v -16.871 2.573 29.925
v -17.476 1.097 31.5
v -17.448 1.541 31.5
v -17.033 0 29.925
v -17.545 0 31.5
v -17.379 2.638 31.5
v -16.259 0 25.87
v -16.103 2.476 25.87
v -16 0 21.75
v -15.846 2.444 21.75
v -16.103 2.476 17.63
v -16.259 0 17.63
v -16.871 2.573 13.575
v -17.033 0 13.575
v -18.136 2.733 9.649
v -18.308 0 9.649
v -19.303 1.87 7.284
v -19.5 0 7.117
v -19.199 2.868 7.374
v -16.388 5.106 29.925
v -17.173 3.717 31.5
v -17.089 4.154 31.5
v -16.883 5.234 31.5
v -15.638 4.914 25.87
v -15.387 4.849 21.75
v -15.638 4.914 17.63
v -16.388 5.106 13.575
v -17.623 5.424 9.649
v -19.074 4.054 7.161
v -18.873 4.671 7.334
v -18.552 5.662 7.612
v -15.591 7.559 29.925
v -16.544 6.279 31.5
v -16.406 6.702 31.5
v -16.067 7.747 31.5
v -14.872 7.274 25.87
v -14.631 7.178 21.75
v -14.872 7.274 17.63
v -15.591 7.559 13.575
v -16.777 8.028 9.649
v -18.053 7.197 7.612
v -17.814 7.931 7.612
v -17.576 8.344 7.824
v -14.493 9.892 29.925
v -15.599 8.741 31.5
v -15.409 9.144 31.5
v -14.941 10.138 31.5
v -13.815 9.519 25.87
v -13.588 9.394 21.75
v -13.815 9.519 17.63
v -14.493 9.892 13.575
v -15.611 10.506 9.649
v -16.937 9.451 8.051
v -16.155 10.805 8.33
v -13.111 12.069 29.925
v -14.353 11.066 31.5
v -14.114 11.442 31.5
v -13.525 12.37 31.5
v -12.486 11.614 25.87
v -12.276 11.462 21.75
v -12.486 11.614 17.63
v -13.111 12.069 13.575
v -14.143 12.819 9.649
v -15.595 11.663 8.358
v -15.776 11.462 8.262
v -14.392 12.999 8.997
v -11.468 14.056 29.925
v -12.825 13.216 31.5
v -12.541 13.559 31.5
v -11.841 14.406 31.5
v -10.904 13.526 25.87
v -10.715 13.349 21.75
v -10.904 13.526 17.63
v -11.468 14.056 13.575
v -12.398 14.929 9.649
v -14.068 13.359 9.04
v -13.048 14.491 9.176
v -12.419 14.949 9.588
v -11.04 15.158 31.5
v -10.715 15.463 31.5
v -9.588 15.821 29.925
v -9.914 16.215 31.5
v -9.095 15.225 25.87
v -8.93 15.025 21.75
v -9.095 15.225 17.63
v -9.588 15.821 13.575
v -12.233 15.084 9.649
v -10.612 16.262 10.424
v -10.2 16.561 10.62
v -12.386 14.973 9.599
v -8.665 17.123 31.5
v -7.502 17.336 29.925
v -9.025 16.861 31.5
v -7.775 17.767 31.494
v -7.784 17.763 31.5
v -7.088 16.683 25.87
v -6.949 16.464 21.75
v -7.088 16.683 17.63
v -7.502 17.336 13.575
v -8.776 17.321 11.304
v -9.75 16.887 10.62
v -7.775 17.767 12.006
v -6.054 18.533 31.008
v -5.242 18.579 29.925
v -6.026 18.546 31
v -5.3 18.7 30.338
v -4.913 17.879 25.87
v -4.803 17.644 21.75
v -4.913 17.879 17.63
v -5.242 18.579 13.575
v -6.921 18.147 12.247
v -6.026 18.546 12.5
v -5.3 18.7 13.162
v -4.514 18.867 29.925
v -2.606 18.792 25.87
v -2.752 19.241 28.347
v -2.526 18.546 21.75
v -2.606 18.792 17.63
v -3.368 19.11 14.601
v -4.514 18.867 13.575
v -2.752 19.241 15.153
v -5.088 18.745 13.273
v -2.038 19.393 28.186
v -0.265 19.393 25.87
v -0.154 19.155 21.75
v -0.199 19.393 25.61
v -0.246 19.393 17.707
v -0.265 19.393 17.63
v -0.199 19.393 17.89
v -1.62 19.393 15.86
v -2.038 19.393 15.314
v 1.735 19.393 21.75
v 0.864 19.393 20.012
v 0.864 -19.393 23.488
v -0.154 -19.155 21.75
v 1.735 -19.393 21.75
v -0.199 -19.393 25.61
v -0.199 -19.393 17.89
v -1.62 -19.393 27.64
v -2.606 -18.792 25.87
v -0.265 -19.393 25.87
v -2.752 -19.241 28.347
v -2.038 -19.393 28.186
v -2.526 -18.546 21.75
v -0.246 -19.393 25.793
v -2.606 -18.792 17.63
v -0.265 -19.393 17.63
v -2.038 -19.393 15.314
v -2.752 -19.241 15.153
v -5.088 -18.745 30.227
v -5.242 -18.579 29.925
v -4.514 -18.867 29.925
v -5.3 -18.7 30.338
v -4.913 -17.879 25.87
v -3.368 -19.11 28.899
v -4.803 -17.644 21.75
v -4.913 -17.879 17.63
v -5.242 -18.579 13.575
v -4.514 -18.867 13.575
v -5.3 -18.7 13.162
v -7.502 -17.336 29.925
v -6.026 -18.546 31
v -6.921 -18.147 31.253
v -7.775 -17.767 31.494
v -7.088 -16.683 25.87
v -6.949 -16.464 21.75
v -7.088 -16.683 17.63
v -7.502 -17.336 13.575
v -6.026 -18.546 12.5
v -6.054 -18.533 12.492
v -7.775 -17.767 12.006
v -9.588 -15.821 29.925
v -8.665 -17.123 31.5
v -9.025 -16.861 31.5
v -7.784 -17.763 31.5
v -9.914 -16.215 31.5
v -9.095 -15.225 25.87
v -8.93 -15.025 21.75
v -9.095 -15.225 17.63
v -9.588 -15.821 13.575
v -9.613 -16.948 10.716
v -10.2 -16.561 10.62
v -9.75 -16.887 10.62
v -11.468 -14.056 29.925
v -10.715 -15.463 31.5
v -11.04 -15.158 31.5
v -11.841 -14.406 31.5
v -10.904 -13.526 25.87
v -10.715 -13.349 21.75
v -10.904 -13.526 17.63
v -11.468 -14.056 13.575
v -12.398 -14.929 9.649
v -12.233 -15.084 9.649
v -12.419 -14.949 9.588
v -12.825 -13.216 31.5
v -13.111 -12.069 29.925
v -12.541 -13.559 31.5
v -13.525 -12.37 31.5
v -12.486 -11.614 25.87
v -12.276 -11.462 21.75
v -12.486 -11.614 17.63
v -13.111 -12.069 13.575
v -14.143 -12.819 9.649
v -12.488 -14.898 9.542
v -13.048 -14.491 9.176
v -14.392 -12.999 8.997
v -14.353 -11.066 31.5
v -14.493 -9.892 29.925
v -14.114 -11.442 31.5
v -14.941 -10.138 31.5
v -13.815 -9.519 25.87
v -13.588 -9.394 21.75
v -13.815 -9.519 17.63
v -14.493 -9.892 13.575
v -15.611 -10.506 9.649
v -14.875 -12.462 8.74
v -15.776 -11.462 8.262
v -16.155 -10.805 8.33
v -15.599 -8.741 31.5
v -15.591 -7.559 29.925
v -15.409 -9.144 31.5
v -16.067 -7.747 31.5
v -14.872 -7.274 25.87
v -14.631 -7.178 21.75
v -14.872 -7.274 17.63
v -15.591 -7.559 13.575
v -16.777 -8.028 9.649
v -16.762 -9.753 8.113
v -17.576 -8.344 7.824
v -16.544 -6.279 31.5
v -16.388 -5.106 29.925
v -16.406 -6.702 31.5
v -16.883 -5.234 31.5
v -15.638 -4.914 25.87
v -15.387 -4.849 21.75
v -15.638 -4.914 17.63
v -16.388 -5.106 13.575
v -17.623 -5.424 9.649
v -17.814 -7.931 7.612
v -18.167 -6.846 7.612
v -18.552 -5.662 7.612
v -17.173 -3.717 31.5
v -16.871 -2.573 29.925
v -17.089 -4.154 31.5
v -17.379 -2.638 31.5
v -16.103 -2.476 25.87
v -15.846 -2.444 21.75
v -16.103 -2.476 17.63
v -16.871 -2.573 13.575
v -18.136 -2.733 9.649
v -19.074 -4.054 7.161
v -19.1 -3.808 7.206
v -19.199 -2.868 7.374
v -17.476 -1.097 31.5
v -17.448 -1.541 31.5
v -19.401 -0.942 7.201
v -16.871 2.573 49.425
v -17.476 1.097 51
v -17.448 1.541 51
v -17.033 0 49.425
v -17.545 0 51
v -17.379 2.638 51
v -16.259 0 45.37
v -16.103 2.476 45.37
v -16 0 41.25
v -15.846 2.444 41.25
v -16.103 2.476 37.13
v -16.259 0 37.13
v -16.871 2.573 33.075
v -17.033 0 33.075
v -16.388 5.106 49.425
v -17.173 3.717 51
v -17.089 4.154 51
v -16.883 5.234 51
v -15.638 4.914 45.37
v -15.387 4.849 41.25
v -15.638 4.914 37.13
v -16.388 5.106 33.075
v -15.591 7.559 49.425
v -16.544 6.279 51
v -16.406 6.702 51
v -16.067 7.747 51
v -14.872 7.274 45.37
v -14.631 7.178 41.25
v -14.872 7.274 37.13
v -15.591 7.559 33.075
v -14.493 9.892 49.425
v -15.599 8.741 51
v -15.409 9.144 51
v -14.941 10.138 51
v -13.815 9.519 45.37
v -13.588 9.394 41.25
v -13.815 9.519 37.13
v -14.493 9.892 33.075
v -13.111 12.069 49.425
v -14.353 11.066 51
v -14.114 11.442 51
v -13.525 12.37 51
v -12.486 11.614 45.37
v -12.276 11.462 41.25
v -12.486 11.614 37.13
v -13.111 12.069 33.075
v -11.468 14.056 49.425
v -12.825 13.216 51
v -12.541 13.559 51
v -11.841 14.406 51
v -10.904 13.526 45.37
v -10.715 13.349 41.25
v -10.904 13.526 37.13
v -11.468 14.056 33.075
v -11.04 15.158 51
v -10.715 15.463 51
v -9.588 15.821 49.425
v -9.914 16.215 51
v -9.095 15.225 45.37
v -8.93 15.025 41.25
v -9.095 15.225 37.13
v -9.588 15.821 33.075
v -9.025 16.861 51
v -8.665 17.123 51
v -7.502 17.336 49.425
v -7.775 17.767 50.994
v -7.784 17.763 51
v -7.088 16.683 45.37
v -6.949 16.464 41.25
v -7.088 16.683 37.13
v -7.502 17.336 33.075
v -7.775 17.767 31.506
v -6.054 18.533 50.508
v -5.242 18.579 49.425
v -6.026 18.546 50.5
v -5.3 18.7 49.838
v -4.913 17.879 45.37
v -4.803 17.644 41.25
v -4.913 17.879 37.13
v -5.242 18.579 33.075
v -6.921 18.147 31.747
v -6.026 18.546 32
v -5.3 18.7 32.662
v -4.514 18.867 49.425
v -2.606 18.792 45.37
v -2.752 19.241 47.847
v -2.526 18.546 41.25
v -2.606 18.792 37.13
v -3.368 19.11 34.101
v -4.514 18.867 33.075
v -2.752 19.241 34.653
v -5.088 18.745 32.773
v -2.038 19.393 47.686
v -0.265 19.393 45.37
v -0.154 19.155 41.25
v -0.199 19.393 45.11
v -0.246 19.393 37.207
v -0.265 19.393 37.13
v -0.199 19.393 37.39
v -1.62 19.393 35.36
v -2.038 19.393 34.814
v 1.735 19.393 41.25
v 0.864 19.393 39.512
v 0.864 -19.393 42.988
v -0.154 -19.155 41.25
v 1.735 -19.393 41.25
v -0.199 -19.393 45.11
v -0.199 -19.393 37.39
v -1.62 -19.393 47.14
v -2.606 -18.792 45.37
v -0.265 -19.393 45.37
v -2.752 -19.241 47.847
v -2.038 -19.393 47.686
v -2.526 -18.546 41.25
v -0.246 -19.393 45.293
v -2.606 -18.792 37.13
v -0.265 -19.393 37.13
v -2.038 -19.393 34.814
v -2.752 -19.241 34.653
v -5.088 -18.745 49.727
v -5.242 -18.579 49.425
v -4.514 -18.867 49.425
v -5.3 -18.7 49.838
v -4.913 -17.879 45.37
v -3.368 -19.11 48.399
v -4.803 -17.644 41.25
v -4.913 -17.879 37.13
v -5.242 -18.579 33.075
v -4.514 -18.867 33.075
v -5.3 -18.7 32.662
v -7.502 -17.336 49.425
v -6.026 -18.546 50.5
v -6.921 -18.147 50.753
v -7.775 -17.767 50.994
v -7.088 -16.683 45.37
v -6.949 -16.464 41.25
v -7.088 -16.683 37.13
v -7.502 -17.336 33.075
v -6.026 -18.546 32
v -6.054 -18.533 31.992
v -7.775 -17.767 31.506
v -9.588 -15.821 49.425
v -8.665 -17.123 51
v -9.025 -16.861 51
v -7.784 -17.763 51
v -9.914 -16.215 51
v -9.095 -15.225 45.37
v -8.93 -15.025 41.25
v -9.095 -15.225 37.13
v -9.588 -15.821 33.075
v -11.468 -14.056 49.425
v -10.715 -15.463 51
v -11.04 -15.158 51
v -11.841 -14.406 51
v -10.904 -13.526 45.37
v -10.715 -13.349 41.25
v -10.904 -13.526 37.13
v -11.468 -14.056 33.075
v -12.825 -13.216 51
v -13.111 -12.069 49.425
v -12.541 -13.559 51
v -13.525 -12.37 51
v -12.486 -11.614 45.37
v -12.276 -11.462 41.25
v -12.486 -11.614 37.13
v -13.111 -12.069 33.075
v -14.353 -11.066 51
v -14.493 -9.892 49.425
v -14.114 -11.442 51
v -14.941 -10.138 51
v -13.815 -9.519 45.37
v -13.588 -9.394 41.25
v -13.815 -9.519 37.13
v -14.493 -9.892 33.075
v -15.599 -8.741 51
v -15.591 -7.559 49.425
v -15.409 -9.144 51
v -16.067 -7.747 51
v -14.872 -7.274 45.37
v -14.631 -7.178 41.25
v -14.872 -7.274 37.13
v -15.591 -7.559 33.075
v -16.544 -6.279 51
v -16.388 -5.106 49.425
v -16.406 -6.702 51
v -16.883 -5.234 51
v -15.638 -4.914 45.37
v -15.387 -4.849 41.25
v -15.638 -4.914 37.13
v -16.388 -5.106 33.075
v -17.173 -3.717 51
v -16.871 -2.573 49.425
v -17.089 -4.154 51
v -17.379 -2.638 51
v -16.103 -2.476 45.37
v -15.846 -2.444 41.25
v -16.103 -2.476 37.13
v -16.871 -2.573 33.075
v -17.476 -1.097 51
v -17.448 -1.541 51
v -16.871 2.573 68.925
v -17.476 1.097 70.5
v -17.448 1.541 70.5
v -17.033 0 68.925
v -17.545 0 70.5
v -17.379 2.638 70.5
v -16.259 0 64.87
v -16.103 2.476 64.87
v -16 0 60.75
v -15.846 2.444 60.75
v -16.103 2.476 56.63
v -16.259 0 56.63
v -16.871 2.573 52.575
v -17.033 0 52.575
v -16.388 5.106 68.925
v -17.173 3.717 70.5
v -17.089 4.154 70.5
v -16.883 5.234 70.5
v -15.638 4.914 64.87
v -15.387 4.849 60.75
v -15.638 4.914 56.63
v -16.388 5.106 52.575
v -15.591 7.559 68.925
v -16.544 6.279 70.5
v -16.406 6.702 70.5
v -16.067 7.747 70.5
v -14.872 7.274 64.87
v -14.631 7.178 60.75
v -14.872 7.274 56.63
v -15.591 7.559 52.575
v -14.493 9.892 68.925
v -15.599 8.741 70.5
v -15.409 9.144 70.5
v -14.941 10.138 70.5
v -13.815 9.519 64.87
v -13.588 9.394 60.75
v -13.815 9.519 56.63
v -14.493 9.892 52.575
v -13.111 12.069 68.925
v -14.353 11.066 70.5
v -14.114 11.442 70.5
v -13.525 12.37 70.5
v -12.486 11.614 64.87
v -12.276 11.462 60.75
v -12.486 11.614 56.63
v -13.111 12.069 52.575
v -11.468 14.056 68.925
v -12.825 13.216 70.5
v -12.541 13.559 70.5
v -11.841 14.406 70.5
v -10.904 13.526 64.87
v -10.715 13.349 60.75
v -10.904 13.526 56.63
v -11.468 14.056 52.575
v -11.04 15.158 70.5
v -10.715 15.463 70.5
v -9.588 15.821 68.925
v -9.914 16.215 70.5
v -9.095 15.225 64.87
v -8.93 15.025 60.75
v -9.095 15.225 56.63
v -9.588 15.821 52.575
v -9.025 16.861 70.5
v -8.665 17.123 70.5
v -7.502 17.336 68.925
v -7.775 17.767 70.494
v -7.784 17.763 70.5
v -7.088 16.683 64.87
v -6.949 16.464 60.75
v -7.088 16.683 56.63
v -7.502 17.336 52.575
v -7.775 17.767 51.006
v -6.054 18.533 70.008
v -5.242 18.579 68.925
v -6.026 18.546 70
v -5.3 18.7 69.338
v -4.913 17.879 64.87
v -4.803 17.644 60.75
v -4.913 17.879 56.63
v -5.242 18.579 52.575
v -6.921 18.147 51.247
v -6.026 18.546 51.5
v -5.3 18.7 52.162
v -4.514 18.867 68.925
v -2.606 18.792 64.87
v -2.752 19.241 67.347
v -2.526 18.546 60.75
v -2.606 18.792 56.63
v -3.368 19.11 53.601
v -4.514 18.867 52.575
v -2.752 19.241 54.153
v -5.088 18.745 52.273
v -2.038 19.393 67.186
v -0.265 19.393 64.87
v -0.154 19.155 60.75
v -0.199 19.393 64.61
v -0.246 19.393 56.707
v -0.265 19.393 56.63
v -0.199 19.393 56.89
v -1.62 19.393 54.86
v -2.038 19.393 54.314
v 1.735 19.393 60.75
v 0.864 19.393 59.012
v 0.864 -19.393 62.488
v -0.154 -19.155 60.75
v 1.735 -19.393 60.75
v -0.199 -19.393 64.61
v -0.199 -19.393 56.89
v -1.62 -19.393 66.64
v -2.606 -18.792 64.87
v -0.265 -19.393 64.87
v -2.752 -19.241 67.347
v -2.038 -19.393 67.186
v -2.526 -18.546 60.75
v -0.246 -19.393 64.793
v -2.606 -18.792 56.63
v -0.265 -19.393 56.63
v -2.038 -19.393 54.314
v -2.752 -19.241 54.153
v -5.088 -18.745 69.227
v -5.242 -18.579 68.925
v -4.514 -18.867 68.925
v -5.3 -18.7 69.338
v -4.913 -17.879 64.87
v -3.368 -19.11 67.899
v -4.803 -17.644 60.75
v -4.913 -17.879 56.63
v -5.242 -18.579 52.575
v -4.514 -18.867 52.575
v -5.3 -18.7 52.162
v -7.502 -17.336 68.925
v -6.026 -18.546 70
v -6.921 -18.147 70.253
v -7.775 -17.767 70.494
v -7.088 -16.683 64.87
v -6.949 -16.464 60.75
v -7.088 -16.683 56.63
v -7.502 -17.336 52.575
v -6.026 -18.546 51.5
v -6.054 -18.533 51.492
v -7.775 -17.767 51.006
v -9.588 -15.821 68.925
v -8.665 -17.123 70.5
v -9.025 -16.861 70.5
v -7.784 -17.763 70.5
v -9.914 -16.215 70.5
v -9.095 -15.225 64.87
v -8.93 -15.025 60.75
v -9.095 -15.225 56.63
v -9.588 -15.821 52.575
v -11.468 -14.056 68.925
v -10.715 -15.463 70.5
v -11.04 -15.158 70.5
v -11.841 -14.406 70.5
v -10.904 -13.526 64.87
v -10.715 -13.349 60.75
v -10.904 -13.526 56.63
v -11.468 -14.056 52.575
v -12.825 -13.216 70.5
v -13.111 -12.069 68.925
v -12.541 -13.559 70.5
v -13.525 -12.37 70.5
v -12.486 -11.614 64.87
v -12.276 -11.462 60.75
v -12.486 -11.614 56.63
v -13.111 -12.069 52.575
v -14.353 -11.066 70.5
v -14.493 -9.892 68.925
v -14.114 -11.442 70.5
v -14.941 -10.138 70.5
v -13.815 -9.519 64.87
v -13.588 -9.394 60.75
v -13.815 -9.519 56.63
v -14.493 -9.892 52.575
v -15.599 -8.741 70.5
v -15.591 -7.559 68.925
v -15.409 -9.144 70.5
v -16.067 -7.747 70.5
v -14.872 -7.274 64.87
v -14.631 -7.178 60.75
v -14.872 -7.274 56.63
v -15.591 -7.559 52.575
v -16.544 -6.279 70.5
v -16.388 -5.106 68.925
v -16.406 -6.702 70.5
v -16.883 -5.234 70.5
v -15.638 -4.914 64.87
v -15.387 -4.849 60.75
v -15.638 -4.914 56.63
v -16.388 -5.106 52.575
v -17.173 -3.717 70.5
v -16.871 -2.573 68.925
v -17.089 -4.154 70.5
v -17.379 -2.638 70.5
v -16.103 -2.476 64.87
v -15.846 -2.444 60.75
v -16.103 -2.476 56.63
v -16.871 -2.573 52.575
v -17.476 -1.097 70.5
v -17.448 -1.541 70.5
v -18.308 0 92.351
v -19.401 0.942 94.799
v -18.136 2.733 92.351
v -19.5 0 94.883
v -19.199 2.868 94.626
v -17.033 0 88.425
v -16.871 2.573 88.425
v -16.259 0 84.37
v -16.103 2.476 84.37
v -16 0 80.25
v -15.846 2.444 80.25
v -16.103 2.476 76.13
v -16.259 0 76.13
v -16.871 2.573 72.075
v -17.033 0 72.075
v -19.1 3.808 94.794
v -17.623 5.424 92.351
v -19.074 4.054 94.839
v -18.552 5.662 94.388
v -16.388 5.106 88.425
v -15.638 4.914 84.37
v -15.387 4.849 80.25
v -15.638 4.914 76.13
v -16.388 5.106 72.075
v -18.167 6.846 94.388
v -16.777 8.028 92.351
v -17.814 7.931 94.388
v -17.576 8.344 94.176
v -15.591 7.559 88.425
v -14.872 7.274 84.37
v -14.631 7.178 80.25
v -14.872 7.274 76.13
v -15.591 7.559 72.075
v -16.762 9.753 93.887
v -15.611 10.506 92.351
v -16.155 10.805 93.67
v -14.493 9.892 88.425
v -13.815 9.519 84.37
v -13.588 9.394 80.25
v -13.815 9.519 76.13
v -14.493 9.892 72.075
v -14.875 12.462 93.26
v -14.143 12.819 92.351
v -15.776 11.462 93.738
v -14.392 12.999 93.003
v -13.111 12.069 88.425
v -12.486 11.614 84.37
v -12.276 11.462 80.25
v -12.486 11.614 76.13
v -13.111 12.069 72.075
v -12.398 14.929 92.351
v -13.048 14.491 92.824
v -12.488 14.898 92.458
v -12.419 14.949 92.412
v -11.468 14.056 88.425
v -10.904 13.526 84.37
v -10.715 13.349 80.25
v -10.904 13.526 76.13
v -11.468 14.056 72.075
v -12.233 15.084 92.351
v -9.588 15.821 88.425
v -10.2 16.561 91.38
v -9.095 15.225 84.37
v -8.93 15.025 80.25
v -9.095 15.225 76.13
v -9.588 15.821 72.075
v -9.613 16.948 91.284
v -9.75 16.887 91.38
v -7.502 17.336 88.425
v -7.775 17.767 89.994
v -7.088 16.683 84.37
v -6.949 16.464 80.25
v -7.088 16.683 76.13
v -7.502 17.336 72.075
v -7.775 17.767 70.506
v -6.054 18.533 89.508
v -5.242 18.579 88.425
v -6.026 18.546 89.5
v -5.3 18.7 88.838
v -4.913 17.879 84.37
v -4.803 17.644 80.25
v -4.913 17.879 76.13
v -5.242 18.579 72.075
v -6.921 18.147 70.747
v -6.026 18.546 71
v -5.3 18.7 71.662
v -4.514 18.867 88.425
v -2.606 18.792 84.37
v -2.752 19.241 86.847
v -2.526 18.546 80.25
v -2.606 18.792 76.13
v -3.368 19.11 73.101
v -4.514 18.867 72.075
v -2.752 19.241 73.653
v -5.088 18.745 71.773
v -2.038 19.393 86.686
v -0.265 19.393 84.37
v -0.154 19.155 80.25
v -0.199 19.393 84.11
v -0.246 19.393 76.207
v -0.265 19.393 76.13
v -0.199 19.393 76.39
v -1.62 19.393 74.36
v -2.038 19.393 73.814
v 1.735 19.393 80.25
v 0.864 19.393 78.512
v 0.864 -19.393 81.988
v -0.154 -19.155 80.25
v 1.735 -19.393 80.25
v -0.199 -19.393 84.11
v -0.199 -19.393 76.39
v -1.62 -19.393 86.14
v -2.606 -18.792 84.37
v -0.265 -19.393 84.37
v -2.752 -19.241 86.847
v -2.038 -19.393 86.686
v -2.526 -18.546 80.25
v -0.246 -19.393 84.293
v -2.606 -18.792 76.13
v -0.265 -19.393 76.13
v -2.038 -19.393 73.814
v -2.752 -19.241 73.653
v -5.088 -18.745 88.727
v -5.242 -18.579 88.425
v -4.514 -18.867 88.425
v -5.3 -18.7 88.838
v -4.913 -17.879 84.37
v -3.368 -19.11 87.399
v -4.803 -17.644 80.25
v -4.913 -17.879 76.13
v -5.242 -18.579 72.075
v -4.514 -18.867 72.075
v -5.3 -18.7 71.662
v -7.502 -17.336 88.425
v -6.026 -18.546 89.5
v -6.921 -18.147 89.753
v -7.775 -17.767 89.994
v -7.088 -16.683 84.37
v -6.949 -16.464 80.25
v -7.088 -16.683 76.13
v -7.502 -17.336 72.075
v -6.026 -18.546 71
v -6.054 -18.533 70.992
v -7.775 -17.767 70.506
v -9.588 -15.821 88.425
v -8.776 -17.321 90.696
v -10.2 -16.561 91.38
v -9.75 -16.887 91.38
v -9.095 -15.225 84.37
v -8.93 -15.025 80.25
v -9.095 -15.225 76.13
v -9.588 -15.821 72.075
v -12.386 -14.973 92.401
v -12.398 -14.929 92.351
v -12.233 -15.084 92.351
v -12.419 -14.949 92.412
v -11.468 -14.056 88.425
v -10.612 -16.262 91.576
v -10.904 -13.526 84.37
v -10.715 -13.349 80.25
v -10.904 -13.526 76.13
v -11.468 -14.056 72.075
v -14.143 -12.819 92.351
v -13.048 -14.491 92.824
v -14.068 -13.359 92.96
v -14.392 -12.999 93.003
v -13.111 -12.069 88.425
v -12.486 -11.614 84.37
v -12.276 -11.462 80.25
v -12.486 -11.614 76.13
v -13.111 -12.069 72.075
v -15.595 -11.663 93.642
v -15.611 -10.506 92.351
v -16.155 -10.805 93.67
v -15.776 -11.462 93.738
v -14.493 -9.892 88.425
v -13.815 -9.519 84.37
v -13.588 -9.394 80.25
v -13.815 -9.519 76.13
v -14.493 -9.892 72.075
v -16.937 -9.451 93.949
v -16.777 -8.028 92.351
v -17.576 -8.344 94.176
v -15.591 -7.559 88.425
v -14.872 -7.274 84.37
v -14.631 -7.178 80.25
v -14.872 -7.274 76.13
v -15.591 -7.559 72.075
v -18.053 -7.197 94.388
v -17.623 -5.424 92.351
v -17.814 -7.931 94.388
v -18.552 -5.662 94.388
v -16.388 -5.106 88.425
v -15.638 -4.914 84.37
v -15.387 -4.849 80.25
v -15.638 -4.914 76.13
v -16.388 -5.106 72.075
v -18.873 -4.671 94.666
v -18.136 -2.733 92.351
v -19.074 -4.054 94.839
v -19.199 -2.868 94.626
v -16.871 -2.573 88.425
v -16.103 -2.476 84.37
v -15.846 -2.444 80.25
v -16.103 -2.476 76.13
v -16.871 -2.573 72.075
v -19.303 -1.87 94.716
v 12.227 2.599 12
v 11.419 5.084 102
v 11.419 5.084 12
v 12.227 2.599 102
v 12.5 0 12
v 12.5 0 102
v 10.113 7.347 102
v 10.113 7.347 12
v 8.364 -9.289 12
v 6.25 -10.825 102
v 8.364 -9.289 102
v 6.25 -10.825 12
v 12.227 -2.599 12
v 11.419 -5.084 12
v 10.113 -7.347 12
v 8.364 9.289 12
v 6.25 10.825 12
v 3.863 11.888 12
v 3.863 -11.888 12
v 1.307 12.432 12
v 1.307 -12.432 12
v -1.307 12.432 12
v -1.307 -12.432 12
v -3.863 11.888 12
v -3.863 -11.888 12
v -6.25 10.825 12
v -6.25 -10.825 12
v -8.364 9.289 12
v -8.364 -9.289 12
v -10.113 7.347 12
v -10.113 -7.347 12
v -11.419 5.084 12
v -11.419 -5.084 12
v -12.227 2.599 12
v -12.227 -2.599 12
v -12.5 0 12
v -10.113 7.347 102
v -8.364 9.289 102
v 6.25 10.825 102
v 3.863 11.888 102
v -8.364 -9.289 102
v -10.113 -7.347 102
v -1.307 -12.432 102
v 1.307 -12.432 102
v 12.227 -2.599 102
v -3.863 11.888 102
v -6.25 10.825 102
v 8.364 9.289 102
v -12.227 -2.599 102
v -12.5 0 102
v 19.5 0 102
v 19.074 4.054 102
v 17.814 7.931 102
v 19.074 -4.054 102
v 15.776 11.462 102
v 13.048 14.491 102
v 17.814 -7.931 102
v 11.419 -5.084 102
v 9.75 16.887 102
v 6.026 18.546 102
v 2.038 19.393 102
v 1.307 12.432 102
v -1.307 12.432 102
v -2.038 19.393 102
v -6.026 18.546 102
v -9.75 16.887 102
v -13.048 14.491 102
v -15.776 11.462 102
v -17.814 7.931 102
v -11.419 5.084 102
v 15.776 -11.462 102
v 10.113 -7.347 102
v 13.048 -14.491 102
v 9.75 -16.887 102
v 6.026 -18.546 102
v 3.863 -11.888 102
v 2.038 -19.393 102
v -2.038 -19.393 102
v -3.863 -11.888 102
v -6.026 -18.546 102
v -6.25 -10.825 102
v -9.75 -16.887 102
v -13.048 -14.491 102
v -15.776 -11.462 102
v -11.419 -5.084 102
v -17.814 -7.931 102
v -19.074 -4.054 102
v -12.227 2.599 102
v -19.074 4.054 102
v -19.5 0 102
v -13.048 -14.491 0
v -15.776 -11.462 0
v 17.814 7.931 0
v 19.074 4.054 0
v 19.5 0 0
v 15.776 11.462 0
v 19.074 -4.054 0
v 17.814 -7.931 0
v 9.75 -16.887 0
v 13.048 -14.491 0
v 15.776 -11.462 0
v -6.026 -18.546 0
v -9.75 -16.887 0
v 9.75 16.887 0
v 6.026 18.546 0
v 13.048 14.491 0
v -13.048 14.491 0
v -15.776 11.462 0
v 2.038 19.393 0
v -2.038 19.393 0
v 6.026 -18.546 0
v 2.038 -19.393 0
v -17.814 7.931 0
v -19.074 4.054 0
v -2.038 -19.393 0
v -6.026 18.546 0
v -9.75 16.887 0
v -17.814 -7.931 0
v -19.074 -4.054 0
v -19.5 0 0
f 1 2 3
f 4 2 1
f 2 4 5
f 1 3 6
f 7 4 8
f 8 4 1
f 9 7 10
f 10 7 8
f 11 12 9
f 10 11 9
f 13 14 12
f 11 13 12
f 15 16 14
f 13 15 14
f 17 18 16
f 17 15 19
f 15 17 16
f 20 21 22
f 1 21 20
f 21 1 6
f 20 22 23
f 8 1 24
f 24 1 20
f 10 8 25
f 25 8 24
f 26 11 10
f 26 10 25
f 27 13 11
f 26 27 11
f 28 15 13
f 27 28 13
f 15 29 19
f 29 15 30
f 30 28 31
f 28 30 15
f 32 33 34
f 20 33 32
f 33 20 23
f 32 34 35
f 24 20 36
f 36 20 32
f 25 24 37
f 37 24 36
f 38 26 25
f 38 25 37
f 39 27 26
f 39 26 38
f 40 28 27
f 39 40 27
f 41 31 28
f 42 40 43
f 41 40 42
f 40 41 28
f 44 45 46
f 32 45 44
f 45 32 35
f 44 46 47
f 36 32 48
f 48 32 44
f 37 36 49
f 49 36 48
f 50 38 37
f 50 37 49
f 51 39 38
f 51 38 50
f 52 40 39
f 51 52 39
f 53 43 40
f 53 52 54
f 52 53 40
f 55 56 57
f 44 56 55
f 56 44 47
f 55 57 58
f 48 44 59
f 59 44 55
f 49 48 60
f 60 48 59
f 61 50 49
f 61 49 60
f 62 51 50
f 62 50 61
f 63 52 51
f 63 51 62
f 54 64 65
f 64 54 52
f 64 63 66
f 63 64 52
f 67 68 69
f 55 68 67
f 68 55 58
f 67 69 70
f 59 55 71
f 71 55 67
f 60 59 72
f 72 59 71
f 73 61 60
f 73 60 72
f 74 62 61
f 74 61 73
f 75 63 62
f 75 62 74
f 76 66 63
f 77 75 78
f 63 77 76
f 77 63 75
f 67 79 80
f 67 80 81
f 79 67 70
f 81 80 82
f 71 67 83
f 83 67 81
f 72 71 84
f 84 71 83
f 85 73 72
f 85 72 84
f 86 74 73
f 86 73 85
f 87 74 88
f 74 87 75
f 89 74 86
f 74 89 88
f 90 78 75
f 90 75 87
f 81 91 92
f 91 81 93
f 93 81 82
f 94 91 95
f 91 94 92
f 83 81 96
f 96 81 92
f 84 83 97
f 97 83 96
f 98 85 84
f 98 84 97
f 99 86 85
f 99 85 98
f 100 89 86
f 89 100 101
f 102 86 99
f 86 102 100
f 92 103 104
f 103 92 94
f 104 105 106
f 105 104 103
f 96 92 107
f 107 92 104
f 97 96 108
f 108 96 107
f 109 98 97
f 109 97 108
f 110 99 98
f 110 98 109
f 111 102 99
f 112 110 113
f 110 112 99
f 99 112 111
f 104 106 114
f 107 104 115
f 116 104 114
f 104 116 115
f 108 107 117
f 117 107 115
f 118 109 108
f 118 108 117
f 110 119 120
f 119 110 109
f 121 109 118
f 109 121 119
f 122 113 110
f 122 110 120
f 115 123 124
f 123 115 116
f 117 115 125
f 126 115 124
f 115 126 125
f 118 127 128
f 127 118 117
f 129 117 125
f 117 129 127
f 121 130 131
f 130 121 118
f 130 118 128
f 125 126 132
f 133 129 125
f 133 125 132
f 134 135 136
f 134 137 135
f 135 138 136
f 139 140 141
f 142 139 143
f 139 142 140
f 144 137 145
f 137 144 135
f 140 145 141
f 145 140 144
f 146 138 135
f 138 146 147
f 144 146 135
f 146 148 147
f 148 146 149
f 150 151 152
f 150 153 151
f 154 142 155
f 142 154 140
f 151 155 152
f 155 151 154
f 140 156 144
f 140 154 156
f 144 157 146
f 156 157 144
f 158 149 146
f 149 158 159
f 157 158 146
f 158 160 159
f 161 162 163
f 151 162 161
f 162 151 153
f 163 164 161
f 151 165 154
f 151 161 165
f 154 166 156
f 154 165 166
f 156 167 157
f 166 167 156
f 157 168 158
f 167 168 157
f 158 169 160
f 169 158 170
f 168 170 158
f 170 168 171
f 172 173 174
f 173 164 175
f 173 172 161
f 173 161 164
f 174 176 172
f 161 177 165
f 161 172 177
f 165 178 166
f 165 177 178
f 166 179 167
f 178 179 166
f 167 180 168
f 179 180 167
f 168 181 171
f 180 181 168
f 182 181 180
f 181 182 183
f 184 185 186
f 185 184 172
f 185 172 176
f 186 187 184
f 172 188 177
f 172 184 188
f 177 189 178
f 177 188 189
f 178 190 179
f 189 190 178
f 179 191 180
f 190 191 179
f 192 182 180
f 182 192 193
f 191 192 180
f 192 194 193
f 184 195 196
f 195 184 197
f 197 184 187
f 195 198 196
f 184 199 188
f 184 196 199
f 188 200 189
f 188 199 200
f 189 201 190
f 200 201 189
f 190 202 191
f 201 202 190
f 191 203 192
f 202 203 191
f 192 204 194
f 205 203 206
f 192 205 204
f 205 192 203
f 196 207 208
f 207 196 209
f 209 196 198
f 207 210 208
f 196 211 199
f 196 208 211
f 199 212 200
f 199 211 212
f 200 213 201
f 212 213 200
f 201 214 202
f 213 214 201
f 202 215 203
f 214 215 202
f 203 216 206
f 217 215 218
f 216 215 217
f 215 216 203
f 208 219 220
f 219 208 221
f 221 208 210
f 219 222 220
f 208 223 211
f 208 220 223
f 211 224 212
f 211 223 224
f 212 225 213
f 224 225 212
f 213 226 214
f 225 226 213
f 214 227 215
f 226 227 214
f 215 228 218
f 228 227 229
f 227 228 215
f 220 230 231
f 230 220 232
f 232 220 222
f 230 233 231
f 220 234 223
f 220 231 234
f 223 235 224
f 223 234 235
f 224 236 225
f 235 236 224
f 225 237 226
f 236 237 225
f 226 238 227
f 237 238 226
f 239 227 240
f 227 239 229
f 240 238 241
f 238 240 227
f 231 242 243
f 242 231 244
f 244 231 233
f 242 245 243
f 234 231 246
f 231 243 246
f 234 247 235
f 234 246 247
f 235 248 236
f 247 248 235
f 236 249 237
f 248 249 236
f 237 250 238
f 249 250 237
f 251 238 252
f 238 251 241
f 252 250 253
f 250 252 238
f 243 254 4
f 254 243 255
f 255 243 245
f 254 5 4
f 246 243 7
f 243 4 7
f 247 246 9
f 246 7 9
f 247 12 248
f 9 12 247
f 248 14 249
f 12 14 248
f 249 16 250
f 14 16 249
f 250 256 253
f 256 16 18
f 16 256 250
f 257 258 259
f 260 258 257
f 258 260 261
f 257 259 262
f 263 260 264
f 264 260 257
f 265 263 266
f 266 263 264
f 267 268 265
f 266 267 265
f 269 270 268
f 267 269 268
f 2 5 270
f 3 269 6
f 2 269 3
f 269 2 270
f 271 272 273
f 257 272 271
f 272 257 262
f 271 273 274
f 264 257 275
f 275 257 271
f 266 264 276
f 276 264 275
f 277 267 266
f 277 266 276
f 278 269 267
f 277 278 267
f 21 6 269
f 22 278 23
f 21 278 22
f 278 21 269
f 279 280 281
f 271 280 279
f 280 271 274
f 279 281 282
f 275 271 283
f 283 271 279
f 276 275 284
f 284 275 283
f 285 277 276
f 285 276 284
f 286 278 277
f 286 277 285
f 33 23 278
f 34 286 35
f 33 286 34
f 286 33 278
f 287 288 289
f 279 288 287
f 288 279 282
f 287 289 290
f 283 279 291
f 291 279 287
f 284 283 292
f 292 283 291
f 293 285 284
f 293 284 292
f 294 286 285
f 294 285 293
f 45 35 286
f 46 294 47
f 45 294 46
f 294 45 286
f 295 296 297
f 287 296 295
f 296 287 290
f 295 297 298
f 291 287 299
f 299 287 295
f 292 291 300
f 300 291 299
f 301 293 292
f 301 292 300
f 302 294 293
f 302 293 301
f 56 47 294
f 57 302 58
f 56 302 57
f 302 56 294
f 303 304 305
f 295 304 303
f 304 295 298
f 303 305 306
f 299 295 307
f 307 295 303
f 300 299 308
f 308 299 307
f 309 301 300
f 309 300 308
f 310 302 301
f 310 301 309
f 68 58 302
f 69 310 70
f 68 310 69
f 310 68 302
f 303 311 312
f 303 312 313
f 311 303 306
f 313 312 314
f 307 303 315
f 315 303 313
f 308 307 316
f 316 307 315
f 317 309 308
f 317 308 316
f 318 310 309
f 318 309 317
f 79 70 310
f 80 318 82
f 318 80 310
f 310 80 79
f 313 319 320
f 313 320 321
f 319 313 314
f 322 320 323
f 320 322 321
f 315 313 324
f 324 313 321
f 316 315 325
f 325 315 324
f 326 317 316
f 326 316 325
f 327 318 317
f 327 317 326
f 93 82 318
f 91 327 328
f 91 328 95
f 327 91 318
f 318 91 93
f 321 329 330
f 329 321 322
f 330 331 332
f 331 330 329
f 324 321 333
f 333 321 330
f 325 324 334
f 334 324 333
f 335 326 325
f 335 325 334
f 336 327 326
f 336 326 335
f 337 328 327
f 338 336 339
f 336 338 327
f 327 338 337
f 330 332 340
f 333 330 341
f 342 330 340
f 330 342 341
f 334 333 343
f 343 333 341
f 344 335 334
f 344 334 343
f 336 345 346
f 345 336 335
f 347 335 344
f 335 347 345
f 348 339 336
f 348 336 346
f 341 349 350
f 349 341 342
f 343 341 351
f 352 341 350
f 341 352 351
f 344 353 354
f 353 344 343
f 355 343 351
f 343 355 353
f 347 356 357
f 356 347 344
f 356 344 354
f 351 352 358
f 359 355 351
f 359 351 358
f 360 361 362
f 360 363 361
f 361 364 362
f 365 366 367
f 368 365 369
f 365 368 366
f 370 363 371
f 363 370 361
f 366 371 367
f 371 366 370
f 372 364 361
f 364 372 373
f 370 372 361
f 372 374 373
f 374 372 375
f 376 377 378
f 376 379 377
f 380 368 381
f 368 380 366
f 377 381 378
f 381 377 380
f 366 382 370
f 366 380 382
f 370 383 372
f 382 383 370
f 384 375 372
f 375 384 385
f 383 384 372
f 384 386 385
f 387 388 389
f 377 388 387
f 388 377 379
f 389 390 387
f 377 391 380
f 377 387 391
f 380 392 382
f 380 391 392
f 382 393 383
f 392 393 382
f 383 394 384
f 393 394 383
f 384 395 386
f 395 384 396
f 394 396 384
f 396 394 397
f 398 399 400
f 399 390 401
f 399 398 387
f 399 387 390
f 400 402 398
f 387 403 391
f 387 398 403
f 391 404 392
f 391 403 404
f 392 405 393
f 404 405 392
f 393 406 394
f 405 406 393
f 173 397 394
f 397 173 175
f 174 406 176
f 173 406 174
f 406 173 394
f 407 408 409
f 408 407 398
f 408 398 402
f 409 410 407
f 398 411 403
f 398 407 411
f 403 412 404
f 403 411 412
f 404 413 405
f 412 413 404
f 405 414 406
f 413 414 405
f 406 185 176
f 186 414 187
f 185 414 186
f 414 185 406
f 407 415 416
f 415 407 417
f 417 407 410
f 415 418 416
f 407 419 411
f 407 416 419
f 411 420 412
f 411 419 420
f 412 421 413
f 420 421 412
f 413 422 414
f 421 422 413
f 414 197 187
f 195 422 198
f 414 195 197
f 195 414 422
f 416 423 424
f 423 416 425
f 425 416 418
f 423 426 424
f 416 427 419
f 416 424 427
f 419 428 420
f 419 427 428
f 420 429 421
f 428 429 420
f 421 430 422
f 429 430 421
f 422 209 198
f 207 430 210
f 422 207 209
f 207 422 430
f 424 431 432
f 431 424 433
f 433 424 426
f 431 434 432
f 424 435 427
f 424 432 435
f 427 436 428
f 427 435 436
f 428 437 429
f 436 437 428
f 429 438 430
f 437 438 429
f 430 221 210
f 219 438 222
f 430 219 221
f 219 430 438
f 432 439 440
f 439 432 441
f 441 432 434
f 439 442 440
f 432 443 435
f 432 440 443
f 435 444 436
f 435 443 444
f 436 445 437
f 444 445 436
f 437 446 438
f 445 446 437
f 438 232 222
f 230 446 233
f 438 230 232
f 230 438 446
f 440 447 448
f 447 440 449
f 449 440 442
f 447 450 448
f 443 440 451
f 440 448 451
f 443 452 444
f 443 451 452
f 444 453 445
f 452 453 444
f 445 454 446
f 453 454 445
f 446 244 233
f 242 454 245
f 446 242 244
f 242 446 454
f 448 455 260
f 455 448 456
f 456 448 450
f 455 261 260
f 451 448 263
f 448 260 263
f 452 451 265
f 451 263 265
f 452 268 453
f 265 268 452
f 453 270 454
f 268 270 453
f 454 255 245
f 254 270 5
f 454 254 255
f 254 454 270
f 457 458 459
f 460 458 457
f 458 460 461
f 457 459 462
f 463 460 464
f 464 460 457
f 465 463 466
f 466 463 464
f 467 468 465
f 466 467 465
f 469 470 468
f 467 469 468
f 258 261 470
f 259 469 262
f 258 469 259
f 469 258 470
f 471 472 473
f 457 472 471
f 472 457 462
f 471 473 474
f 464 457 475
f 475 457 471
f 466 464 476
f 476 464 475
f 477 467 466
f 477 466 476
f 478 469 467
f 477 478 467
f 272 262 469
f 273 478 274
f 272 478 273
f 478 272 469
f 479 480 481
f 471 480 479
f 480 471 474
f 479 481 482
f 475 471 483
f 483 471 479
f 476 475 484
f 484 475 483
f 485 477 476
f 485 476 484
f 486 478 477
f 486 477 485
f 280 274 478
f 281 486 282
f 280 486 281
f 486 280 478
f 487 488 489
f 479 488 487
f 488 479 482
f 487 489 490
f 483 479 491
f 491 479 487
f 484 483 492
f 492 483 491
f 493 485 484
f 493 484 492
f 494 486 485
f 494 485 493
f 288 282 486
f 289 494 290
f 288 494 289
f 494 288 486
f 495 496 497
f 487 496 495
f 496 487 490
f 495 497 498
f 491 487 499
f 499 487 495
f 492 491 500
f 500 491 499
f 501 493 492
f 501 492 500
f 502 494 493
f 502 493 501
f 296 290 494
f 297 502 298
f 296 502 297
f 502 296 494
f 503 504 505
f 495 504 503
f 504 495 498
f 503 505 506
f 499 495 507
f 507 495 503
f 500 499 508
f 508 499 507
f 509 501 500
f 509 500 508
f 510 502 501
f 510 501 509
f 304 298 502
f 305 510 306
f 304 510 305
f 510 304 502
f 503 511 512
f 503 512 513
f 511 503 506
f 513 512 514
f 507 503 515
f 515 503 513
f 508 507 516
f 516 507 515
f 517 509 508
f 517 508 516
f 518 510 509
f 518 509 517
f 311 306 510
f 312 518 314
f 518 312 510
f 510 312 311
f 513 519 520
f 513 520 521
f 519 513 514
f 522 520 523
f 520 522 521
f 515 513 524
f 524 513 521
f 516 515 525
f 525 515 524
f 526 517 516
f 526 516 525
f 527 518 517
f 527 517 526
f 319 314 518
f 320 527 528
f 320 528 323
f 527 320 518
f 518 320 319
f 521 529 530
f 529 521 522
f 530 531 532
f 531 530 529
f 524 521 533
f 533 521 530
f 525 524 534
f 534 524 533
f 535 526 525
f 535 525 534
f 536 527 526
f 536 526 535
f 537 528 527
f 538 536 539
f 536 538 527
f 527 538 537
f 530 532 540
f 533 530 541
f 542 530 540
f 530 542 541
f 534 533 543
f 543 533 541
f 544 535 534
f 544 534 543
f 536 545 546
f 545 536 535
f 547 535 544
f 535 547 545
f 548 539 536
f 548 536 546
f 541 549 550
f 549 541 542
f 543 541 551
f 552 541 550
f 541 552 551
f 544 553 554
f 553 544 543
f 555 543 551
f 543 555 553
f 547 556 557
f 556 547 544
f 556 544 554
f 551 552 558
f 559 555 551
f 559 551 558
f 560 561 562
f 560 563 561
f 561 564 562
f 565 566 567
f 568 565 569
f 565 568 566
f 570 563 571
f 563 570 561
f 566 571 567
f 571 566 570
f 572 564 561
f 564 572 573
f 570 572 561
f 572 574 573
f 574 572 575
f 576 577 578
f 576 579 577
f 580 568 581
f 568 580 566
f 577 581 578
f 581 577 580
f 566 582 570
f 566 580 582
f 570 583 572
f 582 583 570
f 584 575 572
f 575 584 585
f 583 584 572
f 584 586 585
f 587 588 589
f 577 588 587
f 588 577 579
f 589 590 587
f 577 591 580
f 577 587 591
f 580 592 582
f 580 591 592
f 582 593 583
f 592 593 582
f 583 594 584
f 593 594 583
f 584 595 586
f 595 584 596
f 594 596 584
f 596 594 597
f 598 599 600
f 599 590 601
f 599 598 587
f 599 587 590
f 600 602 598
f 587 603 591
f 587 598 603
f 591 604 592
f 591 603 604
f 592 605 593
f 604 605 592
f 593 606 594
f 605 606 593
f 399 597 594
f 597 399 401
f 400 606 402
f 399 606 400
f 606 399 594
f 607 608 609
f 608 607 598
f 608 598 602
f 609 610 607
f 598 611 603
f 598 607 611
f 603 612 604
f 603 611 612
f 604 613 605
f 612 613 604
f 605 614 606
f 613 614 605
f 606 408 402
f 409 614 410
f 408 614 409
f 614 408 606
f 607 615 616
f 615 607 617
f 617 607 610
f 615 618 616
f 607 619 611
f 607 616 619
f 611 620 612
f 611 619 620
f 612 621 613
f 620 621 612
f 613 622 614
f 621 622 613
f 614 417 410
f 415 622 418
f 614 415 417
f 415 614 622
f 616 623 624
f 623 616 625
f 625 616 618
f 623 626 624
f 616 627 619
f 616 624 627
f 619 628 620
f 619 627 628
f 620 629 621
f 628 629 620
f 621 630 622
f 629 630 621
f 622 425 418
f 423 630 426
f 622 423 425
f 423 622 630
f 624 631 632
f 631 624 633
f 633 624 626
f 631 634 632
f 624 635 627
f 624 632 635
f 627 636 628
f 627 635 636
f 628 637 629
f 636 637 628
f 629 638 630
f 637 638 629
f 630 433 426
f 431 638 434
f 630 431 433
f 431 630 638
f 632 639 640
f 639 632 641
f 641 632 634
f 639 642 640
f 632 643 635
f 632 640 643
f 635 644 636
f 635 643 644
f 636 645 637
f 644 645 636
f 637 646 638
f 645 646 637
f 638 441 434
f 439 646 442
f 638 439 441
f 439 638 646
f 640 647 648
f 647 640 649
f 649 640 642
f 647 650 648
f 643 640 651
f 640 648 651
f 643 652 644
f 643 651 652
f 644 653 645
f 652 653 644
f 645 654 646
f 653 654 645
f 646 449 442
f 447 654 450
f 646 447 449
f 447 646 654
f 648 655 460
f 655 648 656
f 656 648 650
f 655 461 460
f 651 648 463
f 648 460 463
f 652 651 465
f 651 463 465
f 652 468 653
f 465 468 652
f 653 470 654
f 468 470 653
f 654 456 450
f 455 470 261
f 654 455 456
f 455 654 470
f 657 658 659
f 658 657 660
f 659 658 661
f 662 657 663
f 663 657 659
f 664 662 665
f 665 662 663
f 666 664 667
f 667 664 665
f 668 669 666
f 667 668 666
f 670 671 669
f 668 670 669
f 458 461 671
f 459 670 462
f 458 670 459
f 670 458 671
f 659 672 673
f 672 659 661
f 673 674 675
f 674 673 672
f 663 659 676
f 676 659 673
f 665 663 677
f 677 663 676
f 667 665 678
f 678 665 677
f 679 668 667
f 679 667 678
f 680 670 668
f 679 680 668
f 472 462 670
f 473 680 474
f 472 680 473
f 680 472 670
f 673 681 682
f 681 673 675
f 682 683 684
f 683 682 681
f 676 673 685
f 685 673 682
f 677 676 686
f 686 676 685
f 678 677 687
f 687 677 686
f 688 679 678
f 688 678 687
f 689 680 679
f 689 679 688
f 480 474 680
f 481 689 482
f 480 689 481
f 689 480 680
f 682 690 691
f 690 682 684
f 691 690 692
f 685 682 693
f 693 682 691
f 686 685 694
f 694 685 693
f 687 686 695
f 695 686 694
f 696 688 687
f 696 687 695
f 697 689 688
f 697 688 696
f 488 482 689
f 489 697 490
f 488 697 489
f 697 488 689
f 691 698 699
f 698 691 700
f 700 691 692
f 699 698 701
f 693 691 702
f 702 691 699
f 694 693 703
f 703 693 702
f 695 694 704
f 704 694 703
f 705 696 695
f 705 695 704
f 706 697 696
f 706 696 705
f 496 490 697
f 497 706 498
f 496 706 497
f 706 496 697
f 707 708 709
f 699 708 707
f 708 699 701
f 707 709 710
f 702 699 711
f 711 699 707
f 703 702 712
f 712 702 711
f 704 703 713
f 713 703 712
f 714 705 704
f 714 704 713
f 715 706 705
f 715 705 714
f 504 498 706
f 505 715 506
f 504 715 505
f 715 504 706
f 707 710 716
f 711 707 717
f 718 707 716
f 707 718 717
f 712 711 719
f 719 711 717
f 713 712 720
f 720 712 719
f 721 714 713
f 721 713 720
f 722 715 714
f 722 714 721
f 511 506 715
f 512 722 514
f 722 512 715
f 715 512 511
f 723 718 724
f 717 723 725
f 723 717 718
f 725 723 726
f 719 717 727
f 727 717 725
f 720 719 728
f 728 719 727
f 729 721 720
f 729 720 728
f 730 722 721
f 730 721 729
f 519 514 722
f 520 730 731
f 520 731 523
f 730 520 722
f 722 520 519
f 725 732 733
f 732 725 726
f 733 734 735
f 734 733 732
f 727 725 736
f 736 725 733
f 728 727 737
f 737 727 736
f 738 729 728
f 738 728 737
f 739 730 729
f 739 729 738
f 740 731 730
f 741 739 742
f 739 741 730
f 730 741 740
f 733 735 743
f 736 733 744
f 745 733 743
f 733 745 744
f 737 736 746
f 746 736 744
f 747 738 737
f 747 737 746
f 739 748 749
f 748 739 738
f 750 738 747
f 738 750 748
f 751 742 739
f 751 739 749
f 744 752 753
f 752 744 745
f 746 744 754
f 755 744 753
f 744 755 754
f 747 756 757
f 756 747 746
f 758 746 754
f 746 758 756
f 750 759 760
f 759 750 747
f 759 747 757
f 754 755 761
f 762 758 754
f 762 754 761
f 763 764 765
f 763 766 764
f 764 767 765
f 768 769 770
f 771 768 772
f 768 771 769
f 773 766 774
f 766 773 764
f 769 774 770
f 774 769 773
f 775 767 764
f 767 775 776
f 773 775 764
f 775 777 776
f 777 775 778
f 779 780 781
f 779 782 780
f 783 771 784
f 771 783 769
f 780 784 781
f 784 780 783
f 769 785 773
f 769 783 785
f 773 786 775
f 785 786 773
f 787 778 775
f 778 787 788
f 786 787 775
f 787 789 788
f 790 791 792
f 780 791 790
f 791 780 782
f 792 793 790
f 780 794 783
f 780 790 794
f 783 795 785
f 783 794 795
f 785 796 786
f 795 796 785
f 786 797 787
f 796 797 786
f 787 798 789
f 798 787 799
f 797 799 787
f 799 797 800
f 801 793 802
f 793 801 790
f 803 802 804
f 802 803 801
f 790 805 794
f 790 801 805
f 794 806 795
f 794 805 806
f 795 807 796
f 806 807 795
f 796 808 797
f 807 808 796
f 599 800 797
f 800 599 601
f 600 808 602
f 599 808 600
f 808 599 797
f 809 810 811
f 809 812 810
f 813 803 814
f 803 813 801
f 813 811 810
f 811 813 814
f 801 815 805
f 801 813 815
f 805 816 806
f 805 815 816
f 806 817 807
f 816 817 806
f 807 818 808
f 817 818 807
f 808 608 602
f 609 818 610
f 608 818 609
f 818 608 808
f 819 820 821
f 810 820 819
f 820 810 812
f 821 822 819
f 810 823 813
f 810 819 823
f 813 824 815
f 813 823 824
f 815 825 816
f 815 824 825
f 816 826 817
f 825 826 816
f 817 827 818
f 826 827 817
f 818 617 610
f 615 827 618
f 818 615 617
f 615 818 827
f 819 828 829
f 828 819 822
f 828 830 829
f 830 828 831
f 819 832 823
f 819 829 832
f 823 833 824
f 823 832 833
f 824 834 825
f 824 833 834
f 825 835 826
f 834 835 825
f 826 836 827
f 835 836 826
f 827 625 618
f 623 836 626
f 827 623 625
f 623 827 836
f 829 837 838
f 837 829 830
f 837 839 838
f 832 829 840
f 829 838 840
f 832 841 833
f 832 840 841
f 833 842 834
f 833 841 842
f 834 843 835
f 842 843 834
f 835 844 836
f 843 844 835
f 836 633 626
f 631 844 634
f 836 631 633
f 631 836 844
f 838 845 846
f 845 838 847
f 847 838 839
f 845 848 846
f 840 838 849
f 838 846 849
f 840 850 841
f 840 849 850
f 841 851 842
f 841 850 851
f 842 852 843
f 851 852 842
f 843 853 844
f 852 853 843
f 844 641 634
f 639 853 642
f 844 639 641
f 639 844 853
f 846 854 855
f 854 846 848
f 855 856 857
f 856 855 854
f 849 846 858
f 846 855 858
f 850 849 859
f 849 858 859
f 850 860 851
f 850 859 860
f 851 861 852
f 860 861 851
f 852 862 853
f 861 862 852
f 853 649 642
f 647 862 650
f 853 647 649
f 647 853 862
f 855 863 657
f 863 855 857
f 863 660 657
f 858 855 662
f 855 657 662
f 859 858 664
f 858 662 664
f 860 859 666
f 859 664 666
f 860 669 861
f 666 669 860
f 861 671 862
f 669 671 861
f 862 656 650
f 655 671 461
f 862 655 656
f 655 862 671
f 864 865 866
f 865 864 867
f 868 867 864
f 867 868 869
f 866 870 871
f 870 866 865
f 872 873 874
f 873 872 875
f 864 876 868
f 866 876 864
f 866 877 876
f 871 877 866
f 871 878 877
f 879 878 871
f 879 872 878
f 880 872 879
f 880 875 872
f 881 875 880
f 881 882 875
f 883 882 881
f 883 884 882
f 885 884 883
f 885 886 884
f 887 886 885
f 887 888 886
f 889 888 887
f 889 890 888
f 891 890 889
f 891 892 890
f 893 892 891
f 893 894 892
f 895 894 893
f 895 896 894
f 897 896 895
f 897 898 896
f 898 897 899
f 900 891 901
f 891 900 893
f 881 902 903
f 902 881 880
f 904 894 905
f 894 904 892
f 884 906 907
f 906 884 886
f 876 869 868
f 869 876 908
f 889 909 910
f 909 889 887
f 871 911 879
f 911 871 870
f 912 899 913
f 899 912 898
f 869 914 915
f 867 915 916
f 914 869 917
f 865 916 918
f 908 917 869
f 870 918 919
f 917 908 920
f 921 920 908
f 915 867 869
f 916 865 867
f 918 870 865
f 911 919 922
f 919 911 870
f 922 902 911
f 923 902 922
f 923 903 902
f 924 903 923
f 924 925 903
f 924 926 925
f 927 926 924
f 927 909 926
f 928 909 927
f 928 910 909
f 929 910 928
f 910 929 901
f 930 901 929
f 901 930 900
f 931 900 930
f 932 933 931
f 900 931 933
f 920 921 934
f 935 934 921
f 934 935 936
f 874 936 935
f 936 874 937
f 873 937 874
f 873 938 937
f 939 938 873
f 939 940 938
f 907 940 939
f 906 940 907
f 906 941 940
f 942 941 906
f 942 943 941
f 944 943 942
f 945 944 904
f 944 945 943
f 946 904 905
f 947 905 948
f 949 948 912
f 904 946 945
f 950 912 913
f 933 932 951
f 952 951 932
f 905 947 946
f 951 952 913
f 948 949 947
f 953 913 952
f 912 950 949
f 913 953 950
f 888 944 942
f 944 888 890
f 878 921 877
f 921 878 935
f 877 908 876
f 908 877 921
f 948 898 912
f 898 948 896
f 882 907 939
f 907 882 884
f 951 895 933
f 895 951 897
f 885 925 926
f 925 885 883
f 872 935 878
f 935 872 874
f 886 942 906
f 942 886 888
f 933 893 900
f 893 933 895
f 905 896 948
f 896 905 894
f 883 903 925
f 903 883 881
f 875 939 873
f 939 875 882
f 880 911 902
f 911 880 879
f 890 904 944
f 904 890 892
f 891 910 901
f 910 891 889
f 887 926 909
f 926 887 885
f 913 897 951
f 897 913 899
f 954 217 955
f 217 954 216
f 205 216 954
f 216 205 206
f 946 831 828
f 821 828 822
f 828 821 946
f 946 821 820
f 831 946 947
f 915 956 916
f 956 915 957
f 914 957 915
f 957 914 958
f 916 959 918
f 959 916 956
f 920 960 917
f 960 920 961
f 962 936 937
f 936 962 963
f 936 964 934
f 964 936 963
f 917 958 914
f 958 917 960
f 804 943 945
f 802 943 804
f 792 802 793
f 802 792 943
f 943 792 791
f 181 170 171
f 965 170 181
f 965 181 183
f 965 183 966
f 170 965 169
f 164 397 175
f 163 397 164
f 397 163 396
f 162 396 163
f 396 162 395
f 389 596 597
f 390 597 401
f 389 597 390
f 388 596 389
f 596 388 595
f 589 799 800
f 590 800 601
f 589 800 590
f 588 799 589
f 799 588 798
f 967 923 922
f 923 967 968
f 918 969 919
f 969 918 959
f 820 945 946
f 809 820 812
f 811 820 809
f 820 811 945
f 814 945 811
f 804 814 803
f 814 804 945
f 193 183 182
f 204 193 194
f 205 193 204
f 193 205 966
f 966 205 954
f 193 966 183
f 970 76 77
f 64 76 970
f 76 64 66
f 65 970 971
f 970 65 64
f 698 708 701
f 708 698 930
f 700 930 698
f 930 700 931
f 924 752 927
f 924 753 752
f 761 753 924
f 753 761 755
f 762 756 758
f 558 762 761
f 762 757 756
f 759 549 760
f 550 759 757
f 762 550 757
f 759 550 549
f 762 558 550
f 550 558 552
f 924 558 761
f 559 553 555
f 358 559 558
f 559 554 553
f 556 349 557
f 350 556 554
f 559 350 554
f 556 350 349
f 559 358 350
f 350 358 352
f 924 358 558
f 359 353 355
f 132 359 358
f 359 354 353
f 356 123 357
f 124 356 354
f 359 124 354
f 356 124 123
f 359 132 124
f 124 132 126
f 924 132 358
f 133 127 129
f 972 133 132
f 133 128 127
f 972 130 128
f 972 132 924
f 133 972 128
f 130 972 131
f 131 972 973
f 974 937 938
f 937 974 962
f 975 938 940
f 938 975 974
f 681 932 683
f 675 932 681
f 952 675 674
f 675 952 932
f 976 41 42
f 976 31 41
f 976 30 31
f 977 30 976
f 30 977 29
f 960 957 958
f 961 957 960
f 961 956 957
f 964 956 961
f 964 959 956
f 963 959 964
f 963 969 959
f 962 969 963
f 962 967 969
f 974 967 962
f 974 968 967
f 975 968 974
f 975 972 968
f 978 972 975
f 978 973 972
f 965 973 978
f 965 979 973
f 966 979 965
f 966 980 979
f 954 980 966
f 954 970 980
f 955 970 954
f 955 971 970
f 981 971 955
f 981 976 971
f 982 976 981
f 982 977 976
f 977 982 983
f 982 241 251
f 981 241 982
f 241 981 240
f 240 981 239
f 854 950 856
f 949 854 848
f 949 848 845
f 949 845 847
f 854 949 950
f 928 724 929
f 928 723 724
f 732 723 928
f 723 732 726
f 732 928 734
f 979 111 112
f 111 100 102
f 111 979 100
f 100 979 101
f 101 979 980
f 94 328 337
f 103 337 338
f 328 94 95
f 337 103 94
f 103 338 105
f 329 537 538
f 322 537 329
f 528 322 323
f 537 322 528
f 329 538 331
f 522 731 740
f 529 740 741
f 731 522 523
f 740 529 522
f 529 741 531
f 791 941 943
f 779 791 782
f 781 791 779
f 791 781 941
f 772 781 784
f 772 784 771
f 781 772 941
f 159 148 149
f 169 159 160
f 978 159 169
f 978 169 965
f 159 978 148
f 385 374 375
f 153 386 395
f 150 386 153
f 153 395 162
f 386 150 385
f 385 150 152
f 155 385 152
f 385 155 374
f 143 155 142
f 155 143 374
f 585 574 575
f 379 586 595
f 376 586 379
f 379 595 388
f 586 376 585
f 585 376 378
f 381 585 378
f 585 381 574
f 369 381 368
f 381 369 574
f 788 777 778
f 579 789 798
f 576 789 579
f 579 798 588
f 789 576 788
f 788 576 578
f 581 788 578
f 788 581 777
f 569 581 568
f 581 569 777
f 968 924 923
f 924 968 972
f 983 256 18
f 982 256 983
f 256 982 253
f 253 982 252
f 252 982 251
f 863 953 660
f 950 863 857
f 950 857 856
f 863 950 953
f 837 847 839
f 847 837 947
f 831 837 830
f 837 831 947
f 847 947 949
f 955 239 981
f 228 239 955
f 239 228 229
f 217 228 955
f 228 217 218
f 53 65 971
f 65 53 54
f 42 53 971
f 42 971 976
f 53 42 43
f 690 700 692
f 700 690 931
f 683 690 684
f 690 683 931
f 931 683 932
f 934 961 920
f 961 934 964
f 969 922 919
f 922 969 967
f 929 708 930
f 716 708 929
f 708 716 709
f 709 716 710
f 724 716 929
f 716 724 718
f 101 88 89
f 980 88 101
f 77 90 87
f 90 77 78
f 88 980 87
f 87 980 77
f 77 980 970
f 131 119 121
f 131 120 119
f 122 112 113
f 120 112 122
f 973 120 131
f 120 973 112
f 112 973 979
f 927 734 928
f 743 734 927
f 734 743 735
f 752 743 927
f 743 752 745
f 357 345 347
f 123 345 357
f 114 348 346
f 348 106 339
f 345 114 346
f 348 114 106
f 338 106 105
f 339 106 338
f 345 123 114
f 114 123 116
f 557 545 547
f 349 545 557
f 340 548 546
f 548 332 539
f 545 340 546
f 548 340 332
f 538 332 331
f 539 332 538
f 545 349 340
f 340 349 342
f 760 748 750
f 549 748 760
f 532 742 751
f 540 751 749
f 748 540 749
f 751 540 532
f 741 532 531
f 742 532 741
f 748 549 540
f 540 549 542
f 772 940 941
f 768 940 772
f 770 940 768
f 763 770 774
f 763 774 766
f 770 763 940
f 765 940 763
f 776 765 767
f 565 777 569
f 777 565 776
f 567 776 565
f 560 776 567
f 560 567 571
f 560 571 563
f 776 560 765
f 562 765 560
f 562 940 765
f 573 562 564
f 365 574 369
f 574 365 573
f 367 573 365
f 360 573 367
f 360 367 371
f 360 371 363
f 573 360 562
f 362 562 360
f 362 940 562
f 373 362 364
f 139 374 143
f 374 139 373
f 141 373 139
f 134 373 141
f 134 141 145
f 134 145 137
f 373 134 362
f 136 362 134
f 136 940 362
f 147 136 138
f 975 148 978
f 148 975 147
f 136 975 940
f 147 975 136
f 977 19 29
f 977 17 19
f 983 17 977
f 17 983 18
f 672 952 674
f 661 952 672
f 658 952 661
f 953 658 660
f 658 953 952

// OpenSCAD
// preview[view:north, tilt:top diagonal]

//What diameter does the broom handle have?
stick_diameter = 25;

//On average, how far apart are your fingers (center to center)?
finger_spacing = 23; //[10:35]

//How much thicker do you want the handle to be than the original broom handle?
padding = "Some"; //[A lot thicker,Some,Only a little]

if(padding=="A lot thicker") assign(pad=12) handle(pad);
if(padding=="Only a little") assign(pad=3) handle(pad);
if(padding=="Some") assign(pad=7) handle(pad);


module handle(padd){
	
	ir=stick_diameter/2;
	or=ir+padd;
	hi=4*finger_spacing+10;
	edge=padd+5;
	res=50*1;
	
	difference(){
		cylinder(r=or,h=hi);
	
		union(){
			for(i=[0:3])translate([(or-ir)/2,0,edge+((hi-2*edge)*(i+.5)/4)]){
				rotate_extrude(convexity = 10, $fn = res)
				translate([or*(2+.4*(12/padd)), 0, 0])
				circle(r = (1+.4*(12/padd))*or, $fn = res);
			}
			translate([0,0,edge])cylinder(r=ir,h=hi-edge);
		}
	}

}
